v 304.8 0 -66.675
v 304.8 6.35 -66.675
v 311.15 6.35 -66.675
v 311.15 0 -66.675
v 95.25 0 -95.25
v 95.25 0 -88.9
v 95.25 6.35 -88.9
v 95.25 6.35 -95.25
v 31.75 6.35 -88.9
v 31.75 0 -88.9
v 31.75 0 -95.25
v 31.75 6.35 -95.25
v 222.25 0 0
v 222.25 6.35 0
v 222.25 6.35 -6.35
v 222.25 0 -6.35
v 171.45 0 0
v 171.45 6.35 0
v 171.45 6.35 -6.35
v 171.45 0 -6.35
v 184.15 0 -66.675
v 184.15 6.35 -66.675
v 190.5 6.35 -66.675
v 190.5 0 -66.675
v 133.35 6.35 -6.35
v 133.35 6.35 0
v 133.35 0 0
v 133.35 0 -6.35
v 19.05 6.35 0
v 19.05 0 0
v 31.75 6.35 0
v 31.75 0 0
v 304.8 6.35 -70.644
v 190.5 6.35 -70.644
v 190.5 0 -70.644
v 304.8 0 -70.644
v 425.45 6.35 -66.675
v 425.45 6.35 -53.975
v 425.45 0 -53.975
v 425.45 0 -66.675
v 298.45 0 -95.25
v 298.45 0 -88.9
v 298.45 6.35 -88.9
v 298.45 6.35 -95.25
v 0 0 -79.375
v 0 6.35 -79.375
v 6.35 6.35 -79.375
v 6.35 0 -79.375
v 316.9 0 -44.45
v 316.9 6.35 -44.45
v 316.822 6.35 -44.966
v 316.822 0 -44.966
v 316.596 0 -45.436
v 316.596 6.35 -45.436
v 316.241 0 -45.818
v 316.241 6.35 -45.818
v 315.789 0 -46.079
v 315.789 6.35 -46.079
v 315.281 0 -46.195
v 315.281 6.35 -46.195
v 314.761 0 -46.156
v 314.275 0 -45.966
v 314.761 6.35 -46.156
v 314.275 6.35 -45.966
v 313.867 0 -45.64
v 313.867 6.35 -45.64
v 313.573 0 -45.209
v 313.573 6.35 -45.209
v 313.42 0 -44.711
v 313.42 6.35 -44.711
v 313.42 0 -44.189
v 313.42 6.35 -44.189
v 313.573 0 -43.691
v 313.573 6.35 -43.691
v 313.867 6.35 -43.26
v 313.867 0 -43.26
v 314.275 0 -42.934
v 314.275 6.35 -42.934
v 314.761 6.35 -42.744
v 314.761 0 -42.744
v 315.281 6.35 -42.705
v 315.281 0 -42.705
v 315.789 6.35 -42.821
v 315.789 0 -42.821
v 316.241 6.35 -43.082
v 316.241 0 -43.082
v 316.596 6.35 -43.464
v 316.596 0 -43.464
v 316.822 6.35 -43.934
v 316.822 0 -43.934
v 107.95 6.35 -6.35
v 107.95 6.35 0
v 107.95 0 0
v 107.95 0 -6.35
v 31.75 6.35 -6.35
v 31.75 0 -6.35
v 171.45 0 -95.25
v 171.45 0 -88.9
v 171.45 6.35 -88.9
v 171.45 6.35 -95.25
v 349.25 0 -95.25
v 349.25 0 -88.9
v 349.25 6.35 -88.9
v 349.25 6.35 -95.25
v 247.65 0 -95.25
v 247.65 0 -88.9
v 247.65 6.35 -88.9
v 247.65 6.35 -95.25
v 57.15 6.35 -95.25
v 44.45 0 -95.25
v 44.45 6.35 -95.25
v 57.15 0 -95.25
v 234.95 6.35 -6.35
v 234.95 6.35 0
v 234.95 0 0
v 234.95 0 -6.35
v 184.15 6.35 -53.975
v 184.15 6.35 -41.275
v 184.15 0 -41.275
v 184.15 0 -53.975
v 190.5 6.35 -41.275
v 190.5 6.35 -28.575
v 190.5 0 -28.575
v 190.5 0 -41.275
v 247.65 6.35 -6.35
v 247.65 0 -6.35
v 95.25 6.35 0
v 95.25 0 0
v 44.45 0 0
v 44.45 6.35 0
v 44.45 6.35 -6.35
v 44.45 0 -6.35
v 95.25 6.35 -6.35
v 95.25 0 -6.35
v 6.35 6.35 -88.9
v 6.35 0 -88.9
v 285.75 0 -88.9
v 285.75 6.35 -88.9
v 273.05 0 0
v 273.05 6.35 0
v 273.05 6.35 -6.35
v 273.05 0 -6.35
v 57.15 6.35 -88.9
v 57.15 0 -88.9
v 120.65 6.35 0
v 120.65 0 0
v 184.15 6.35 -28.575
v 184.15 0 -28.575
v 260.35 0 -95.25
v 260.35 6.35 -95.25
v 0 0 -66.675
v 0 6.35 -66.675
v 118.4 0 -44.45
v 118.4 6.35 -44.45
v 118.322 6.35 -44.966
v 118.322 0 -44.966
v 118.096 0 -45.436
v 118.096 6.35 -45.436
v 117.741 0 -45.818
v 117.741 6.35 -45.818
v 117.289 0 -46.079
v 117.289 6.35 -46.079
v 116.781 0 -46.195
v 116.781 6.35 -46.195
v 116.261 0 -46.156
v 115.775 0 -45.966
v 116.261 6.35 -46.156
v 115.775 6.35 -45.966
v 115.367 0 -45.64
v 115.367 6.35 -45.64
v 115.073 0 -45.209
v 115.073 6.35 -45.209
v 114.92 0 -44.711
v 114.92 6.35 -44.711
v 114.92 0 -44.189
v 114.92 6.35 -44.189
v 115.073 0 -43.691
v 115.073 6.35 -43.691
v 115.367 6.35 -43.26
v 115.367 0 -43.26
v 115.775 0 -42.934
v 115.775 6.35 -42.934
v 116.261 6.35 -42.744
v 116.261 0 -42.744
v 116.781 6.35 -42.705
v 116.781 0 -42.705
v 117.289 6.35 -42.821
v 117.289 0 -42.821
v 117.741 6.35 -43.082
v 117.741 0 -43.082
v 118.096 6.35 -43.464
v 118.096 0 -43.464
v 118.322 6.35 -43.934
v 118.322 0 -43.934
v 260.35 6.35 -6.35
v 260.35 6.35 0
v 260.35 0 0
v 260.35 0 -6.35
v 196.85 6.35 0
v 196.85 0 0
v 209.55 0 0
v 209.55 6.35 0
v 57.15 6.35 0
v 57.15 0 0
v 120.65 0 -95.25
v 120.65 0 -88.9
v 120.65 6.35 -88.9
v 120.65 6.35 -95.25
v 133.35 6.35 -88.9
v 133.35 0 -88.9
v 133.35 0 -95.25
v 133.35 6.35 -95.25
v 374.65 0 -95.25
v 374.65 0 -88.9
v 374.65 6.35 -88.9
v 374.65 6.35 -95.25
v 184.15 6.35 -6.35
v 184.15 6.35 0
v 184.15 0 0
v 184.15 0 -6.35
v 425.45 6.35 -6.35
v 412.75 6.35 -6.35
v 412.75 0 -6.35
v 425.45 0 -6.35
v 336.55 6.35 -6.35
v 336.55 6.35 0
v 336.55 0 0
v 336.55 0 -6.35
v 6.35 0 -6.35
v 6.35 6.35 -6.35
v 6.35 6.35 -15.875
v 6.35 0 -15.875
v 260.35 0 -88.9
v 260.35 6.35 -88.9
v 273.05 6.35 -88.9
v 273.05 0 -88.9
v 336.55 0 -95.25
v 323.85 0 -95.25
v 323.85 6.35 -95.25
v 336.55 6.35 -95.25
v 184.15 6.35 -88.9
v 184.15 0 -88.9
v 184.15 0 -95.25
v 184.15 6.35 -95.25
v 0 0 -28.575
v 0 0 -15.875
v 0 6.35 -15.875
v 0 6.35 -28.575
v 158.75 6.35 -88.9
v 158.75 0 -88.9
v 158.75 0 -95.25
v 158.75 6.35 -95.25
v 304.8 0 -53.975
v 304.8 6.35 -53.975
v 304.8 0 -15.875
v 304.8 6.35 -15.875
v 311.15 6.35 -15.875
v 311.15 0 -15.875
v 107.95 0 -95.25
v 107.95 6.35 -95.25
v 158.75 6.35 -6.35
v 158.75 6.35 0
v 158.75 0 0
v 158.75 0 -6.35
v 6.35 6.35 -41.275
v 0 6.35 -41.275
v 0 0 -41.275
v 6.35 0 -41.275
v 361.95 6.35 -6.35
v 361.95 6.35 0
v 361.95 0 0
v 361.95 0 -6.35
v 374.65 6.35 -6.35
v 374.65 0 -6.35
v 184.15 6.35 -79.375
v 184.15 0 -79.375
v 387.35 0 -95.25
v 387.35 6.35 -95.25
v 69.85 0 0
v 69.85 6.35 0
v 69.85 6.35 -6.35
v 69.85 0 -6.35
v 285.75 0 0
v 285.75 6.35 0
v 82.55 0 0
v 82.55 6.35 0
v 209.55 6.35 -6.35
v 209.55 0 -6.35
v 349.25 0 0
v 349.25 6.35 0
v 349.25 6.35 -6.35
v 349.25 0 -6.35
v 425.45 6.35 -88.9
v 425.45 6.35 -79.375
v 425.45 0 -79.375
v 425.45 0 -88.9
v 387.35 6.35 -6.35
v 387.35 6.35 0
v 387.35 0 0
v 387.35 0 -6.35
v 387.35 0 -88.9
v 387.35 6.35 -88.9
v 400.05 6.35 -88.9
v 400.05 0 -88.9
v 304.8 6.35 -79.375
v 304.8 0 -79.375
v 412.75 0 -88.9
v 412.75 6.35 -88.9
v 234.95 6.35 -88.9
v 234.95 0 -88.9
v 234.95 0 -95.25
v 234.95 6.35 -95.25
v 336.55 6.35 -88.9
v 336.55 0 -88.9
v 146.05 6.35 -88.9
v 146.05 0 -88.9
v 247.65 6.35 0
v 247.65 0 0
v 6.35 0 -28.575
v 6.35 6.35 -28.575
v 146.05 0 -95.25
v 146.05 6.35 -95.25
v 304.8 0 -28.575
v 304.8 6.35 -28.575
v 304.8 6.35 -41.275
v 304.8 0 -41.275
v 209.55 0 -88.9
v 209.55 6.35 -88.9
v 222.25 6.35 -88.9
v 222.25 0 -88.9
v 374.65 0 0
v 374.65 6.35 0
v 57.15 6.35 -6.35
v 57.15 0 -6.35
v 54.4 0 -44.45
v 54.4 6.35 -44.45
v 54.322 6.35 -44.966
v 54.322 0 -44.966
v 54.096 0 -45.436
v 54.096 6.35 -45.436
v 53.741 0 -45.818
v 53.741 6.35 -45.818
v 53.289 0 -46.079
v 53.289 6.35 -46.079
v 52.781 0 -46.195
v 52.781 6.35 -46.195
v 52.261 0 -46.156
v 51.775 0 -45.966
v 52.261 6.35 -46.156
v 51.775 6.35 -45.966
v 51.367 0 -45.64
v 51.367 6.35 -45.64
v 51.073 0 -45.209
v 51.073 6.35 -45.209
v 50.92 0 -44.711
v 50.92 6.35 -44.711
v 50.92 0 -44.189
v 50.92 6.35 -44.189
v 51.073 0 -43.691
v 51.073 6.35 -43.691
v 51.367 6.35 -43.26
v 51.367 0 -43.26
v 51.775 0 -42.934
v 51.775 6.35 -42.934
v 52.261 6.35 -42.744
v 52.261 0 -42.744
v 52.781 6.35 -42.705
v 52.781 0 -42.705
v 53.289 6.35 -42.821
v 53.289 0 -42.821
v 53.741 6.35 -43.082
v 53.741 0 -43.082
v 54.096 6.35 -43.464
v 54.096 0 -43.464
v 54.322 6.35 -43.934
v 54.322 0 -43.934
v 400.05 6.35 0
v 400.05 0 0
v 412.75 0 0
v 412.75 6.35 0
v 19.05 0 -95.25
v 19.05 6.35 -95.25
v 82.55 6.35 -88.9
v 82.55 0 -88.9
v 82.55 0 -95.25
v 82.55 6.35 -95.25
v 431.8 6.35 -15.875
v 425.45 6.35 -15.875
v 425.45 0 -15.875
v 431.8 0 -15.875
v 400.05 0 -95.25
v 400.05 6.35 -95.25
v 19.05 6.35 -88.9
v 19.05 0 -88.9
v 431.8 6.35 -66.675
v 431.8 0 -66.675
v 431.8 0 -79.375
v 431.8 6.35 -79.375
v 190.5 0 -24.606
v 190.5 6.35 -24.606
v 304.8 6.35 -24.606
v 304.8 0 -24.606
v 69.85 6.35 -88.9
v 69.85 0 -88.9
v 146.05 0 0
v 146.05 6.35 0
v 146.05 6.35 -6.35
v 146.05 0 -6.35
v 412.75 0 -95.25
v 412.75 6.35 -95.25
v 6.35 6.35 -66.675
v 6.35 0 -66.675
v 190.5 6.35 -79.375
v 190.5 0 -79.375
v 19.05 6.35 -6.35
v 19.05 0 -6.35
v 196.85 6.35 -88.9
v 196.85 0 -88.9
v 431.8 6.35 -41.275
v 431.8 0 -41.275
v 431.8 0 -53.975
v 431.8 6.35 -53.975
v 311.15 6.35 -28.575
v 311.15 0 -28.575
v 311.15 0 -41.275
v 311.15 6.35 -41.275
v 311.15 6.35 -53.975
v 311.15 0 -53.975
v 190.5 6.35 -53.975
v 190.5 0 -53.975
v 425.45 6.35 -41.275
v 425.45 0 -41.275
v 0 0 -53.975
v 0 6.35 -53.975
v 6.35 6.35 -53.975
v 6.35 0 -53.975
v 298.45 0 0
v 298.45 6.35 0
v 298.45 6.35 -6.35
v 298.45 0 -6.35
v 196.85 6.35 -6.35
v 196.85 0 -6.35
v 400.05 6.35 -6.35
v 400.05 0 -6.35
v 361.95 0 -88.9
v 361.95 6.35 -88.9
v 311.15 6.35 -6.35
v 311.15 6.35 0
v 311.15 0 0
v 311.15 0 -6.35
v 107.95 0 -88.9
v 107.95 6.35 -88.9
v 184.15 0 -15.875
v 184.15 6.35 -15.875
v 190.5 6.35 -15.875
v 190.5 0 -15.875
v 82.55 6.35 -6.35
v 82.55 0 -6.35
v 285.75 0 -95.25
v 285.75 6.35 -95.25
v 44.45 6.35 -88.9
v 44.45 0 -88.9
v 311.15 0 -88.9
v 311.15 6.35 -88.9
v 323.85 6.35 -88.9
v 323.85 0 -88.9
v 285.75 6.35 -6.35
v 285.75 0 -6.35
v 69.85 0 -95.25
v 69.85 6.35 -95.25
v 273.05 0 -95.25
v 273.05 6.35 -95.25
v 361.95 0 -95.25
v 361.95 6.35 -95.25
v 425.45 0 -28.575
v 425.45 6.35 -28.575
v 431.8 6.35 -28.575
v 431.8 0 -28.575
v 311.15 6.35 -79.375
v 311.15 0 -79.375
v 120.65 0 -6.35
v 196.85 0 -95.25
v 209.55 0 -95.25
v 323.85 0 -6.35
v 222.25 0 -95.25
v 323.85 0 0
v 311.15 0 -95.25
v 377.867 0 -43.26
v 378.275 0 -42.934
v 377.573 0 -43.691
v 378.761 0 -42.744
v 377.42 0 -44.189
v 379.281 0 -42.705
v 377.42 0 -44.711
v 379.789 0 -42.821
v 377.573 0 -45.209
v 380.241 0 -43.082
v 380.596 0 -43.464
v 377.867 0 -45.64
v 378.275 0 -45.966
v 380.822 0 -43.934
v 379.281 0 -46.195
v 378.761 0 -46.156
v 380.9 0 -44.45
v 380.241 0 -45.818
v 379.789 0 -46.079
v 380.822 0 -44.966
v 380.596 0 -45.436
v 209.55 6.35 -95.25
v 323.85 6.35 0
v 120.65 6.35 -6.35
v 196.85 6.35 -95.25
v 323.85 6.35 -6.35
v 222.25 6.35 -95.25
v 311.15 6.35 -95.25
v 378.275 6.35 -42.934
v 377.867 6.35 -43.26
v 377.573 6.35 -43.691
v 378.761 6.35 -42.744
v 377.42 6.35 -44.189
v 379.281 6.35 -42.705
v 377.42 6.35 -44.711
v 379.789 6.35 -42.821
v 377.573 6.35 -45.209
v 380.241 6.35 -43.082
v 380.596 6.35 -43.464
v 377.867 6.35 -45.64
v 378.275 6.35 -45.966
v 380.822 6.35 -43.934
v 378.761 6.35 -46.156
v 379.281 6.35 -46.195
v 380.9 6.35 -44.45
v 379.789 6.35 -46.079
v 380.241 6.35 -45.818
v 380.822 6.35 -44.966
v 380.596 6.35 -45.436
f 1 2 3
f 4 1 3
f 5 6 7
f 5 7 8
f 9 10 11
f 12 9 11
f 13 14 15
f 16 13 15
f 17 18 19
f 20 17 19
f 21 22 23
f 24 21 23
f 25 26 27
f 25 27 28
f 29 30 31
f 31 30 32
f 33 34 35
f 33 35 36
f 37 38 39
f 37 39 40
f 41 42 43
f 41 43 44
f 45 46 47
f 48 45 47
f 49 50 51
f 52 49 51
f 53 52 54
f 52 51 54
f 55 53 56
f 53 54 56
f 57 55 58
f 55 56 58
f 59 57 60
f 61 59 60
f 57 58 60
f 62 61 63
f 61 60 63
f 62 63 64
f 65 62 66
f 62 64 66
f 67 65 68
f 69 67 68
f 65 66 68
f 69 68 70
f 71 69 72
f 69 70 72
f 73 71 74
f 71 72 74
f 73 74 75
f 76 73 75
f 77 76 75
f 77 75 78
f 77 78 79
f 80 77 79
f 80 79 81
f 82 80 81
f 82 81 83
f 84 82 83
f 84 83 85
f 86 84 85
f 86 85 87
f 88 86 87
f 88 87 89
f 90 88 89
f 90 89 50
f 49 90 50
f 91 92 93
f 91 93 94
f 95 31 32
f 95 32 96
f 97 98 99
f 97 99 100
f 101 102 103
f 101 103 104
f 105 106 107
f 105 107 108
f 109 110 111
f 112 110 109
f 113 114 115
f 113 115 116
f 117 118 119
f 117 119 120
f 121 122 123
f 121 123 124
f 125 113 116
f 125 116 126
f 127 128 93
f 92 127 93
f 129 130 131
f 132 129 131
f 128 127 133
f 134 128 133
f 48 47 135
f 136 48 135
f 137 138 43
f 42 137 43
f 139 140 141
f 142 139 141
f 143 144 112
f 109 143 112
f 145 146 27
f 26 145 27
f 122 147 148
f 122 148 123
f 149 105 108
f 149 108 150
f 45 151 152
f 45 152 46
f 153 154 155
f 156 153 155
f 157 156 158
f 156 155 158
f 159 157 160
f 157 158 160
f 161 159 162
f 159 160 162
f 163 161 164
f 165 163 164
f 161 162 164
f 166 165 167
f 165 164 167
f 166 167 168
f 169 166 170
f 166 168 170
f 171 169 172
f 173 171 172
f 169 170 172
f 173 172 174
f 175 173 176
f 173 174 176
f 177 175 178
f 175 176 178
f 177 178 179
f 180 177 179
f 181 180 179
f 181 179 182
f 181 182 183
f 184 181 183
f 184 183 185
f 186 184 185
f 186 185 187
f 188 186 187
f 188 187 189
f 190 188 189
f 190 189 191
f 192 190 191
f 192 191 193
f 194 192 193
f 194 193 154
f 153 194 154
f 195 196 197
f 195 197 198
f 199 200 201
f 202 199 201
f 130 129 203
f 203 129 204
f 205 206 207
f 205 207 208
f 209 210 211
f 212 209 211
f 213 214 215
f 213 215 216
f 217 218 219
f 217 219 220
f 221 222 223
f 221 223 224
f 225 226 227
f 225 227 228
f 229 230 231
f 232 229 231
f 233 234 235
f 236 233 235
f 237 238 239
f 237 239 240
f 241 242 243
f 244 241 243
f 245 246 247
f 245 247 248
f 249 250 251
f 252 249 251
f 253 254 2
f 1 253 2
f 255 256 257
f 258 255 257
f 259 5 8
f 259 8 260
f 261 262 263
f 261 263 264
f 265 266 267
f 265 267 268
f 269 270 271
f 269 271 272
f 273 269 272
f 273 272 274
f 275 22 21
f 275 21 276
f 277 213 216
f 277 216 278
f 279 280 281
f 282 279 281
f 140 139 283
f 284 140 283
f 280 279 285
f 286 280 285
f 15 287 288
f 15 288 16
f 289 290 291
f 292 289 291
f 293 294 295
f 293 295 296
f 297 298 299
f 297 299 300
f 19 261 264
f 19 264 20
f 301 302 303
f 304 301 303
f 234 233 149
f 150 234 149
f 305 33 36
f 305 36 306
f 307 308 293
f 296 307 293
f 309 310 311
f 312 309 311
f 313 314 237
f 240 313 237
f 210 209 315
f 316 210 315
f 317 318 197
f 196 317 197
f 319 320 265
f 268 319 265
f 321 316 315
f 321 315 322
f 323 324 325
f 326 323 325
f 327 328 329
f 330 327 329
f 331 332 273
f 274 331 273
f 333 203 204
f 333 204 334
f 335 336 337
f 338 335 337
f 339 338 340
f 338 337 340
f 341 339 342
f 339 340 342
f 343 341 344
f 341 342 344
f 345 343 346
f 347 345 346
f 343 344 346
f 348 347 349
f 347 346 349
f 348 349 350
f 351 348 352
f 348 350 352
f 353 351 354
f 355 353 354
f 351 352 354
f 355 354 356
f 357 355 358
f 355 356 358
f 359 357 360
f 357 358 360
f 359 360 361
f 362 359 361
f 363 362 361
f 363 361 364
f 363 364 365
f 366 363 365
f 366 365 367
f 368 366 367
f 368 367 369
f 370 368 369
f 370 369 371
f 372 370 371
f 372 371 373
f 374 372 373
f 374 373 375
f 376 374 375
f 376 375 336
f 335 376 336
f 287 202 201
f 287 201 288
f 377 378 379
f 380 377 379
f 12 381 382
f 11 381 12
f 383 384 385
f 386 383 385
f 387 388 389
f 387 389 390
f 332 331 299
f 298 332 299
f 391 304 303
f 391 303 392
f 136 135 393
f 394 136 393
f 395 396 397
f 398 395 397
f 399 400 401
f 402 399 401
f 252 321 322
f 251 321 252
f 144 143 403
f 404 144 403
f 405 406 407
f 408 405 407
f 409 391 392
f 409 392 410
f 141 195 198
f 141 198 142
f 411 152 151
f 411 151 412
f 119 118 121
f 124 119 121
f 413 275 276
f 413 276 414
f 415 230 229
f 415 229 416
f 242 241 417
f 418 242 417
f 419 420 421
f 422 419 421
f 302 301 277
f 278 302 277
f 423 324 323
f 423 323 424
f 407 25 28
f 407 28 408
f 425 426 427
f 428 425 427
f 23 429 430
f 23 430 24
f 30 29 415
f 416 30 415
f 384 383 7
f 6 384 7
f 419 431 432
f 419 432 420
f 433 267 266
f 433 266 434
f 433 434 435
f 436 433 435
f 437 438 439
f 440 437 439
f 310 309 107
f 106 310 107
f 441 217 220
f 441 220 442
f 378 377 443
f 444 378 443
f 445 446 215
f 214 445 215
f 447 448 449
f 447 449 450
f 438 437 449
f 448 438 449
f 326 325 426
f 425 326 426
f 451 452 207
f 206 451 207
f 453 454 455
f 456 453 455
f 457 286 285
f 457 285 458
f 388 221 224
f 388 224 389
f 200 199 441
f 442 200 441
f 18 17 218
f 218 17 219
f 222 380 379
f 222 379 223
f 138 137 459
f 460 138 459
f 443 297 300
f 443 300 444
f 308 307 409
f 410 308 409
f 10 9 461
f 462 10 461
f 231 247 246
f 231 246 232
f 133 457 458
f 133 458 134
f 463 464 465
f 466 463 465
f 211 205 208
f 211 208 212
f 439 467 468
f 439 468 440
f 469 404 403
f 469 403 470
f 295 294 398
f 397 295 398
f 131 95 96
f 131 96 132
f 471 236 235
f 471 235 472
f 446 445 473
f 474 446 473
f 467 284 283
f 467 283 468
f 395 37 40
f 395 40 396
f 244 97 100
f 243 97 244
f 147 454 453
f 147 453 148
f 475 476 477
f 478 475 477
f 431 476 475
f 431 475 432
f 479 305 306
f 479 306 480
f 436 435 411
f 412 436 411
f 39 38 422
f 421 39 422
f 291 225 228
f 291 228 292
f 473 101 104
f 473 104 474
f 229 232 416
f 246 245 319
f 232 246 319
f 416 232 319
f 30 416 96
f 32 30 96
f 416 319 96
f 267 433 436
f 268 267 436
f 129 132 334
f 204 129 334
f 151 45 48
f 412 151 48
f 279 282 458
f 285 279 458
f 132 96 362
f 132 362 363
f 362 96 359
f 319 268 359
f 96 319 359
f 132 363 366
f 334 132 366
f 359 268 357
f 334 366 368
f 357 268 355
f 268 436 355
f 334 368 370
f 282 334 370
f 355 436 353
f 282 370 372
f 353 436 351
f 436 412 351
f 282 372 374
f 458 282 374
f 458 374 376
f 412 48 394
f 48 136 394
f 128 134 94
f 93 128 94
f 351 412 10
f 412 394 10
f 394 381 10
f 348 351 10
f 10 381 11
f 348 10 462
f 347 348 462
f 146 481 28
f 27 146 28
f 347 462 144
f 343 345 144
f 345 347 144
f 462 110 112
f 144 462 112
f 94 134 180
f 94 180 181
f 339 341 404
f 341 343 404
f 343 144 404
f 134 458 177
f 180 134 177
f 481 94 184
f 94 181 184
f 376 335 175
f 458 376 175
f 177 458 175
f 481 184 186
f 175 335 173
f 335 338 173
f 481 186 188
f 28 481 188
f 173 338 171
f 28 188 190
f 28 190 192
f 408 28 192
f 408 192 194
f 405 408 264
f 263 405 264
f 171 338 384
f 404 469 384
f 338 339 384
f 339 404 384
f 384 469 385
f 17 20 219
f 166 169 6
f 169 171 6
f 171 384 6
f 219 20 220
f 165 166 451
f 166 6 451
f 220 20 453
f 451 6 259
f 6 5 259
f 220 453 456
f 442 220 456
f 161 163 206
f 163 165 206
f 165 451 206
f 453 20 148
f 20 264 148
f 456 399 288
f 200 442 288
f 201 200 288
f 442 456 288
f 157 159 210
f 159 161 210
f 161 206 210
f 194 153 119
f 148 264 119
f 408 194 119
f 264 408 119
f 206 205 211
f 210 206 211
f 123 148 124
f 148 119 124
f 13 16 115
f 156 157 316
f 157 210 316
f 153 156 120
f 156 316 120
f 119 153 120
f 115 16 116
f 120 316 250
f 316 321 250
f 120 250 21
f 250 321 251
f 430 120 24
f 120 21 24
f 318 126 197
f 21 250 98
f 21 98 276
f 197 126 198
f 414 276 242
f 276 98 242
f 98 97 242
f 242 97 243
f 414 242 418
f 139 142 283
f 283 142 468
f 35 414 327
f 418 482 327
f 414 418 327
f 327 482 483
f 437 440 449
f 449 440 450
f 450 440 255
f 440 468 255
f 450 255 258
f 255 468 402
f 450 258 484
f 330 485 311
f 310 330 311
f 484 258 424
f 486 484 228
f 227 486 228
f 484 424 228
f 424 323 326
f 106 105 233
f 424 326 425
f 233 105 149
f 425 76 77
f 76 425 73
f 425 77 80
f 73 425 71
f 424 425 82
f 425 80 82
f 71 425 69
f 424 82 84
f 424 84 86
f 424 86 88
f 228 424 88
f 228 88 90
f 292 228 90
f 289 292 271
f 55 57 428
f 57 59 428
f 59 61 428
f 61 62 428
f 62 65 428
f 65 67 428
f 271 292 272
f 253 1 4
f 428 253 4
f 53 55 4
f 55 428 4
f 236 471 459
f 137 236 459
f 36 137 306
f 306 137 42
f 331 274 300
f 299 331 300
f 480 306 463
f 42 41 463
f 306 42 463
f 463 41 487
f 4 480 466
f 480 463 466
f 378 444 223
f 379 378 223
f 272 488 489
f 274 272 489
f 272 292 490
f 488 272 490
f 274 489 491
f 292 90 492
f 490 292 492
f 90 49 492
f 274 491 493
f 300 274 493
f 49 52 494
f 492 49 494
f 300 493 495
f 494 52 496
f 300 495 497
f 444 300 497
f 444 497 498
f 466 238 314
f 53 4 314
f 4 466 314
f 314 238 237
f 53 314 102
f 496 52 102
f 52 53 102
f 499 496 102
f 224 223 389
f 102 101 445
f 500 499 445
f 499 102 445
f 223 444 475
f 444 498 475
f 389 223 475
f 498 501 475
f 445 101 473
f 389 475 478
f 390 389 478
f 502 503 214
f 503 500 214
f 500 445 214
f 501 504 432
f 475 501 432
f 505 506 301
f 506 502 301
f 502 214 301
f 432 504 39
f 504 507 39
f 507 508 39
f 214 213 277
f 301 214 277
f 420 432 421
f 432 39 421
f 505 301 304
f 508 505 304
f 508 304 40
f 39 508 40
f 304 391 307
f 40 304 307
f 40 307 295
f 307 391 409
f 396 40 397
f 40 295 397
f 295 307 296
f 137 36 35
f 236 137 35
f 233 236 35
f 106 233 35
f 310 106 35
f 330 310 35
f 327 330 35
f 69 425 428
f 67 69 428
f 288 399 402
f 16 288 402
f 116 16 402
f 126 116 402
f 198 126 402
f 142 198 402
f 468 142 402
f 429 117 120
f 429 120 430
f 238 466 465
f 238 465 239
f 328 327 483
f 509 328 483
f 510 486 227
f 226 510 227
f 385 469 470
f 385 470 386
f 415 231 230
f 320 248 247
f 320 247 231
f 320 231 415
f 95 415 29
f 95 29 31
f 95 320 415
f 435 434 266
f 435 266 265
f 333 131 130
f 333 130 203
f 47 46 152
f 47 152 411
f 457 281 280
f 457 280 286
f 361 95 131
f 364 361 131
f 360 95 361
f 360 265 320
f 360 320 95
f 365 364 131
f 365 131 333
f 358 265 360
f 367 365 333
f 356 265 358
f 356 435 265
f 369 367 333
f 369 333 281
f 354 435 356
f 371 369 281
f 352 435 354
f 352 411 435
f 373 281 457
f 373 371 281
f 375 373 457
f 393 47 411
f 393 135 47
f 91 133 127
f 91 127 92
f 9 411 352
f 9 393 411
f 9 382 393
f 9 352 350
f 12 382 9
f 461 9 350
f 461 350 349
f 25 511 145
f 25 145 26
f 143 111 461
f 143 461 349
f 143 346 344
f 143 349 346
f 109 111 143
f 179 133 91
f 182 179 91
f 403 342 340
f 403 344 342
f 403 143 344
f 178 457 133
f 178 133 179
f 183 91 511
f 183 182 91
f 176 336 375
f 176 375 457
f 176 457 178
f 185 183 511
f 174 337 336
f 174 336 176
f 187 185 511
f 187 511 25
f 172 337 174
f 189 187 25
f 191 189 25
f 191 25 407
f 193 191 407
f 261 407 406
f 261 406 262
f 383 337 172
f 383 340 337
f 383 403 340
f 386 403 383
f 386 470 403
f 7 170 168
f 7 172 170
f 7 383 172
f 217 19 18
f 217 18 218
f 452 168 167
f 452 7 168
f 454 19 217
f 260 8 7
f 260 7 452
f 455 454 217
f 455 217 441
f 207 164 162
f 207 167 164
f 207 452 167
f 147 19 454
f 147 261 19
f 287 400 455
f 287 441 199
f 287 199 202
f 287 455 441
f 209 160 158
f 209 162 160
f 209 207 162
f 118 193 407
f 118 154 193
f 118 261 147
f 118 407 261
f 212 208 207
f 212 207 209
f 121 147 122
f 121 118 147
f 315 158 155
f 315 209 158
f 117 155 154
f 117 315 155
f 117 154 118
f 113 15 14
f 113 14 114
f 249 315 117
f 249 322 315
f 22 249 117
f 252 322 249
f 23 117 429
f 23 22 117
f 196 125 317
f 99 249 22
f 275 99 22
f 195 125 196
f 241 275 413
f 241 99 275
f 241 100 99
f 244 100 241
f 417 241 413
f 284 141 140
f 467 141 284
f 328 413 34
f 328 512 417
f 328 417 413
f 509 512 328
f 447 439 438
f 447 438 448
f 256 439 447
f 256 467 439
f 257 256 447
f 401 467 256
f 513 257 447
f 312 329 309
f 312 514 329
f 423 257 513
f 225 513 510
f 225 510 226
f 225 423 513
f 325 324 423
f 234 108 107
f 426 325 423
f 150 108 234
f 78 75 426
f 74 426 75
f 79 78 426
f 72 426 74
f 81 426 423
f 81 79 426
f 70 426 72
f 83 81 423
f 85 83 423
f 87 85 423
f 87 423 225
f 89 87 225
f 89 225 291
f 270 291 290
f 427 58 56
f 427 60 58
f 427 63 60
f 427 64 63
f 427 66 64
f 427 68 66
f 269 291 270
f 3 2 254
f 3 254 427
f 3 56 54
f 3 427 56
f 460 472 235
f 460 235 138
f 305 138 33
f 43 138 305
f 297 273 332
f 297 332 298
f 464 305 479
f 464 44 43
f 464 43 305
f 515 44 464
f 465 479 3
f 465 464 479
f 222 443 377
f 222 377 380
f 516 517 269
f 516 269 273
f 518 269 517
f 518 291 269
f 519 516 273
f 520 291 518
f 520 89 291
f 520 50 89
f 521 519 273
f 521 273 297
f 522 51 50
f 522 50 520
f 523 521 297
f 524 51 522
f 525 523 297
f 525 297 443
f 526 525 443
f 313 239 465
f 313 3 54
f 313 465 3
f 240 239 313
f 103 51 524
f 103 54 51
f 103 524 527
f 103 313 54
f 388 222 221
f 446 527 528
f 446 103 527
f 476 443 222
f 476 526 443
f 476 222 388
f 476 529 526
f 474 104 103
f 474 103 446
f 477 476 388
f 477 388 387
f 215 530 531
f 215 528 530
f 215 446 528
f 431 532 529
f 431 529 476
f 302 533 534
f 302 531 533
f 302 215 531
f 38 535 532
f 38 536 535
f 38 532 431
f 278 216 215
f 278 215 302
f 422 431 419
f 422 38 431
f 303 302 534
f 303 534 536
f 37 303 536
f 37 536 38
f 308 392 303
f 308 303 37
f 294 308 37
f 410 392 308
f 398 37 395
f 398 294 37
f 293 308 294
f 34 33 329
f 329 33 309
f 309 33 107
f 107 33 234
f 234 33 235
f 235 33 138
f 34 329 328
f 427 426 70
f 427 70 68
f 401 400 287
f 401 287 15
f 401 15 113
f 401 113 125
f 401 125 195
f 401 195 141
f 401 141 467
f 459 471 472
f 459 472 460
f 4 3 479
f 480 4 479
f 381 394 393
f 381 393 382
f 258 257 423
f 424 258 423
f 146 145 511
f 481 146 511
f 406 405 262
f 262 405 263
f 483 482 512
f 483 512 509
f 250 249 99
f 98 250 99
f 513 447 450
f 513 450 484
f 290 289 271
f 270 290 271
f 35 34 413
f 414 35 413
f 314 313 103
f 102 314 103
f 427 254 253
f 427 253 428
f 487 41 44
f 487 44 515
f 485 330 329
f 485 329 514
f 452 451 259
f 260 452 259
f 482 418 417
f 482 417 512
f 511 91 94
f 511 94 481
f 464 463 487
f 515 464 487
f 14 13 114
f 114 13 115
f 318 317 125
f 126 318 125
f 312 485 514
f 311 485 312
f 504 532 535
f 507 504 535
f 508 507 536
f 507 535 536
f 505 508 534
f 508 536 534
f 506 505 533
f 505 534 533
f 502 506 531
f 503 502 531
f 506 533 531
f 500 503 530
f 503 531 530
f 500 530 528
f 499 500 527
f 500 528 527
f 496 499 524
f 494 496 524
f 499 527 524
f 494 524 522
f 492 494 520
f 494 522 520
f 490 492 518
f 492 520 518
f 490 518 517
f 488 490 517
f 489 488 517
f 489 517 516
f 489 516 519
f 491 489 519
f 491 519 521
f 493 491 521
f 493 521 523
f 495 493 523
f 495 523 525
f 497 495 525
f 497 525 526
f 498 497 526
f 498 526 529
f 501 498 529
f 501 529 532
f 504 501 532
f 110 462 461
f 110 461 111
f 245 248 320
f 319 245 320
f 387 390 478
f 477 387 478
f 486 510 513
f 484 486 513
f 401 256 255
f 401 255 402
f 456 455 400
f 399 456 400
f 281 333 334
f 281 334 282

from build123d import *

# Parameters (mm, degrees)
SKETCH1_W           = 431.8
SKETCH1_H           = 95.25
BOSS_EXTRUDE1_DEPTH = 6.35
SKETCH2_W           = 12.7
SKETCH2_H           = 6.35
CUT_EXTRUDE1_DEPTH  = 7.35
LPATTERN1_COUNT     = 17
LPATTERN1_PITCH     = 25.4
SKETCH3_W           = 6.35
SKETCH3_H           = 6.35
CUT_EXTRUDE2_DEPTH  = 7.35
SKETCH5_W           = 6.35
SKETCH5_H           = 12.7
CUT_EXTRUDE4_DEPTH  = 7.35
LPATTERN2_COUNT     = 2
LPATTERN2_PITCH     = 25.4
LPATTERN2_COL_COUNT = 2
LPATTERN2_COL_PITCH = 25.4
SKETCH6_W           = 114.3
SKETCH6_H           = 46.0375
CUT_EXTRUDE5_DEPTH  = 7.35
SKETCH7_R           = 1.75
CUT_EXTRUDE6_DEPTH  = 7.35
SKETCH8_W           = 6.35
SKETCH8_H           = 9.525
SKETCH8_H_2         = 12.7
CUT_EXTRUDE7_DEPTH  = 7.35
LPATTERN3_COUNT     = 2
LPATTERN3_PITCH     = 425.45


with BuildPart() as part:
    # Sketch1 → Boss-Extrude1 (new body)
    with BuildSketch(Plane(origin=(0, 0, 0), x_dir=(1, 0, 0), z_dir=(0, 1, 0))):
        with Locations((215.9, 47.625)):
            Rectangle(SKETCH1_W, SKETCH1_H)
    extrude(amount=BOSS_EXTRUDE1_DEPTH)

    # Sketch2 → Cut-Extrude1 (cut, through all)
    with BuildSketch(Plane(origin=(0, 6.35, 0), x_dir=(1, 0, 0), z_dir=(0, 1, 0))):
        with Locations((12.7, 92.075)):
            Rectangle(SKETCH2_W, SKETCH2_H)
        with Locations((12.7, 3.175)):
            Rectangle(SKETCH2_W, SKETCH2_H)
    cut_extrude1 = extrude(amount=-CUT_EXTRUDE1_DEPTH, mode=Mode.SUBTRACT)

    # LPattern1: Cut-Extrude1 ×17
    with Locations(*[(i * LPATTERN1_PITCH, 0, 0) for i in range(1, LPATTERN1_COUNT)]):
        add(cut_extrude1, mode=Mode.SUBTRACT)

    # Sketch3 → Cut-Extrude2 (cut, through all)
    with BuildSketch(Plane(origin=(0, 6.35, 0), x_dir=(1, 0, 0), z_dir=(0, 1, 0))):
        with Locations((3.175, 92.075)):
            Rectangle(SKETCH3_W, SKETCH3_H)
        with Locations((3.175, 3.175)):
            Rectangle(SKETCH3_W, SKETCH3_H)
        with Locations((428.625, 92.075)):
            Rectangle(SKETCH3_W, SKETCH3_H)
        with Locations((428.625, 3.175)):
            Rectangle(SKETCH3_W, SKETCH3_H)
    extrude(amount=-CUT_EXTRUDE2_DEPTH, mode=Mode.SUBTRACT)

    # Sketch5 → Cut-Extrude4 (cut, through all)
    with BuildSketch(Plane(origin=(0, 6.35, 0), x_dir=(1, 0, 0), z_dir=(0, 1, 0))):
        with Locations((187.325, 47.625)):
            Rectangle(SKETCH5_W, SKETCH5_H)
        with Locations((307.975, 47.625)):
            Rectangle(SKETCH5_W, SKETCH5_H)
    cut_extrude4 = extrude(amount=-CUT_EXTRUDE4_DEPTH, mode=Mode.SUBTRACT)

    # LPattern2: Cut-Extrude4 ×2
    with Locations(*[(0, 0, -i * LPATTERN2_PITCH) for i in range(1, LPATTERN2_COUNT)]):
        add(cut_extrude4, mode=Mode.SUBTRACT)

    # LPattern2 col: Cut-Extrude4 ×2
    with Locations(*[(0, 0, i * LPATTERN2_COL_PITCH) for i in range(1, LPATTERN2_COL_COUNT)]):
        add(cut_extrude4, mode=Mode.SUBTRACT)

    # Sketch6 → Cut-Extrude5 (cut, through all)
    with BuildSketch(Plane(origin=(0, 6.35, 0), x_dir=(1, 0, 0), z_dir=(0, 1, 0))):
        with Locations((247.65, 47.625)):
            Rectangle(SKETCH6_W, SKETCH6_H)
    extrude(amount=-CUT_EXTRUDE5_DEPTH, mode=Mode.SUBTRACT)

    # Sketch7 → Cut-Extrude6 (cut, through all)
    with BuildSketch(Plane(origin=(0, 6.35, 0), x_dir=(1, 0, 0), z_dir=(0, 1, 0))):
        with Locations((52.65, 44.45)):
            Circle(SKETCH7_R)
        with Locations((116.65, 44.45)):
            Circle(SKETCH7_R)
        with Locations((315.15, 44.45)):
            Circle(SKETCH7_R)
        with Locations((379.15, 44.45)):
            Circle(SKETCH7_R)
    extrude(amount=-CUT_EXTRUDE6_DEPTH, mode=Mode.SUBTRACT)

    # Sketch8 → Cut-Extrude7 (cut, through all)
    with BuildSketch(Plane(origin=(0, 6.35, 0), x_dir=(1, 0, 0), z_dir=(0, 1, 0))):
        with Locations((3.175, 84.1375)):
            Rectangle(SKETCH8_W, SKETCH8_H)
        with Locations((3.175, 11.1125)):
            Rectangle(SKETCH8_W, SKETCH8_H)
        with Locations((3.175, 34.925)):
            Rectangle(SKETCH8_W, SKETCH8_H_2)
        with Locations((3.175, 60.325)):
            Rectangle(SKETCH8_W, SKETCH8_H_2)
    cut_extrude7 = extrude(amount=-CUT_EXTRUDE7_DEPTH, mode=Mode.SUBTRACT)

    # LPattern3: Cut-Extrude7 ×2
    with Locations(*[(i * LPATTERN3_PITCH, 0, 0) for i in range(1, LPATTERN3_COUNT)]):
        add(cut_extrude7, mode=Mode.SUBTRACT)


solid = part.part
